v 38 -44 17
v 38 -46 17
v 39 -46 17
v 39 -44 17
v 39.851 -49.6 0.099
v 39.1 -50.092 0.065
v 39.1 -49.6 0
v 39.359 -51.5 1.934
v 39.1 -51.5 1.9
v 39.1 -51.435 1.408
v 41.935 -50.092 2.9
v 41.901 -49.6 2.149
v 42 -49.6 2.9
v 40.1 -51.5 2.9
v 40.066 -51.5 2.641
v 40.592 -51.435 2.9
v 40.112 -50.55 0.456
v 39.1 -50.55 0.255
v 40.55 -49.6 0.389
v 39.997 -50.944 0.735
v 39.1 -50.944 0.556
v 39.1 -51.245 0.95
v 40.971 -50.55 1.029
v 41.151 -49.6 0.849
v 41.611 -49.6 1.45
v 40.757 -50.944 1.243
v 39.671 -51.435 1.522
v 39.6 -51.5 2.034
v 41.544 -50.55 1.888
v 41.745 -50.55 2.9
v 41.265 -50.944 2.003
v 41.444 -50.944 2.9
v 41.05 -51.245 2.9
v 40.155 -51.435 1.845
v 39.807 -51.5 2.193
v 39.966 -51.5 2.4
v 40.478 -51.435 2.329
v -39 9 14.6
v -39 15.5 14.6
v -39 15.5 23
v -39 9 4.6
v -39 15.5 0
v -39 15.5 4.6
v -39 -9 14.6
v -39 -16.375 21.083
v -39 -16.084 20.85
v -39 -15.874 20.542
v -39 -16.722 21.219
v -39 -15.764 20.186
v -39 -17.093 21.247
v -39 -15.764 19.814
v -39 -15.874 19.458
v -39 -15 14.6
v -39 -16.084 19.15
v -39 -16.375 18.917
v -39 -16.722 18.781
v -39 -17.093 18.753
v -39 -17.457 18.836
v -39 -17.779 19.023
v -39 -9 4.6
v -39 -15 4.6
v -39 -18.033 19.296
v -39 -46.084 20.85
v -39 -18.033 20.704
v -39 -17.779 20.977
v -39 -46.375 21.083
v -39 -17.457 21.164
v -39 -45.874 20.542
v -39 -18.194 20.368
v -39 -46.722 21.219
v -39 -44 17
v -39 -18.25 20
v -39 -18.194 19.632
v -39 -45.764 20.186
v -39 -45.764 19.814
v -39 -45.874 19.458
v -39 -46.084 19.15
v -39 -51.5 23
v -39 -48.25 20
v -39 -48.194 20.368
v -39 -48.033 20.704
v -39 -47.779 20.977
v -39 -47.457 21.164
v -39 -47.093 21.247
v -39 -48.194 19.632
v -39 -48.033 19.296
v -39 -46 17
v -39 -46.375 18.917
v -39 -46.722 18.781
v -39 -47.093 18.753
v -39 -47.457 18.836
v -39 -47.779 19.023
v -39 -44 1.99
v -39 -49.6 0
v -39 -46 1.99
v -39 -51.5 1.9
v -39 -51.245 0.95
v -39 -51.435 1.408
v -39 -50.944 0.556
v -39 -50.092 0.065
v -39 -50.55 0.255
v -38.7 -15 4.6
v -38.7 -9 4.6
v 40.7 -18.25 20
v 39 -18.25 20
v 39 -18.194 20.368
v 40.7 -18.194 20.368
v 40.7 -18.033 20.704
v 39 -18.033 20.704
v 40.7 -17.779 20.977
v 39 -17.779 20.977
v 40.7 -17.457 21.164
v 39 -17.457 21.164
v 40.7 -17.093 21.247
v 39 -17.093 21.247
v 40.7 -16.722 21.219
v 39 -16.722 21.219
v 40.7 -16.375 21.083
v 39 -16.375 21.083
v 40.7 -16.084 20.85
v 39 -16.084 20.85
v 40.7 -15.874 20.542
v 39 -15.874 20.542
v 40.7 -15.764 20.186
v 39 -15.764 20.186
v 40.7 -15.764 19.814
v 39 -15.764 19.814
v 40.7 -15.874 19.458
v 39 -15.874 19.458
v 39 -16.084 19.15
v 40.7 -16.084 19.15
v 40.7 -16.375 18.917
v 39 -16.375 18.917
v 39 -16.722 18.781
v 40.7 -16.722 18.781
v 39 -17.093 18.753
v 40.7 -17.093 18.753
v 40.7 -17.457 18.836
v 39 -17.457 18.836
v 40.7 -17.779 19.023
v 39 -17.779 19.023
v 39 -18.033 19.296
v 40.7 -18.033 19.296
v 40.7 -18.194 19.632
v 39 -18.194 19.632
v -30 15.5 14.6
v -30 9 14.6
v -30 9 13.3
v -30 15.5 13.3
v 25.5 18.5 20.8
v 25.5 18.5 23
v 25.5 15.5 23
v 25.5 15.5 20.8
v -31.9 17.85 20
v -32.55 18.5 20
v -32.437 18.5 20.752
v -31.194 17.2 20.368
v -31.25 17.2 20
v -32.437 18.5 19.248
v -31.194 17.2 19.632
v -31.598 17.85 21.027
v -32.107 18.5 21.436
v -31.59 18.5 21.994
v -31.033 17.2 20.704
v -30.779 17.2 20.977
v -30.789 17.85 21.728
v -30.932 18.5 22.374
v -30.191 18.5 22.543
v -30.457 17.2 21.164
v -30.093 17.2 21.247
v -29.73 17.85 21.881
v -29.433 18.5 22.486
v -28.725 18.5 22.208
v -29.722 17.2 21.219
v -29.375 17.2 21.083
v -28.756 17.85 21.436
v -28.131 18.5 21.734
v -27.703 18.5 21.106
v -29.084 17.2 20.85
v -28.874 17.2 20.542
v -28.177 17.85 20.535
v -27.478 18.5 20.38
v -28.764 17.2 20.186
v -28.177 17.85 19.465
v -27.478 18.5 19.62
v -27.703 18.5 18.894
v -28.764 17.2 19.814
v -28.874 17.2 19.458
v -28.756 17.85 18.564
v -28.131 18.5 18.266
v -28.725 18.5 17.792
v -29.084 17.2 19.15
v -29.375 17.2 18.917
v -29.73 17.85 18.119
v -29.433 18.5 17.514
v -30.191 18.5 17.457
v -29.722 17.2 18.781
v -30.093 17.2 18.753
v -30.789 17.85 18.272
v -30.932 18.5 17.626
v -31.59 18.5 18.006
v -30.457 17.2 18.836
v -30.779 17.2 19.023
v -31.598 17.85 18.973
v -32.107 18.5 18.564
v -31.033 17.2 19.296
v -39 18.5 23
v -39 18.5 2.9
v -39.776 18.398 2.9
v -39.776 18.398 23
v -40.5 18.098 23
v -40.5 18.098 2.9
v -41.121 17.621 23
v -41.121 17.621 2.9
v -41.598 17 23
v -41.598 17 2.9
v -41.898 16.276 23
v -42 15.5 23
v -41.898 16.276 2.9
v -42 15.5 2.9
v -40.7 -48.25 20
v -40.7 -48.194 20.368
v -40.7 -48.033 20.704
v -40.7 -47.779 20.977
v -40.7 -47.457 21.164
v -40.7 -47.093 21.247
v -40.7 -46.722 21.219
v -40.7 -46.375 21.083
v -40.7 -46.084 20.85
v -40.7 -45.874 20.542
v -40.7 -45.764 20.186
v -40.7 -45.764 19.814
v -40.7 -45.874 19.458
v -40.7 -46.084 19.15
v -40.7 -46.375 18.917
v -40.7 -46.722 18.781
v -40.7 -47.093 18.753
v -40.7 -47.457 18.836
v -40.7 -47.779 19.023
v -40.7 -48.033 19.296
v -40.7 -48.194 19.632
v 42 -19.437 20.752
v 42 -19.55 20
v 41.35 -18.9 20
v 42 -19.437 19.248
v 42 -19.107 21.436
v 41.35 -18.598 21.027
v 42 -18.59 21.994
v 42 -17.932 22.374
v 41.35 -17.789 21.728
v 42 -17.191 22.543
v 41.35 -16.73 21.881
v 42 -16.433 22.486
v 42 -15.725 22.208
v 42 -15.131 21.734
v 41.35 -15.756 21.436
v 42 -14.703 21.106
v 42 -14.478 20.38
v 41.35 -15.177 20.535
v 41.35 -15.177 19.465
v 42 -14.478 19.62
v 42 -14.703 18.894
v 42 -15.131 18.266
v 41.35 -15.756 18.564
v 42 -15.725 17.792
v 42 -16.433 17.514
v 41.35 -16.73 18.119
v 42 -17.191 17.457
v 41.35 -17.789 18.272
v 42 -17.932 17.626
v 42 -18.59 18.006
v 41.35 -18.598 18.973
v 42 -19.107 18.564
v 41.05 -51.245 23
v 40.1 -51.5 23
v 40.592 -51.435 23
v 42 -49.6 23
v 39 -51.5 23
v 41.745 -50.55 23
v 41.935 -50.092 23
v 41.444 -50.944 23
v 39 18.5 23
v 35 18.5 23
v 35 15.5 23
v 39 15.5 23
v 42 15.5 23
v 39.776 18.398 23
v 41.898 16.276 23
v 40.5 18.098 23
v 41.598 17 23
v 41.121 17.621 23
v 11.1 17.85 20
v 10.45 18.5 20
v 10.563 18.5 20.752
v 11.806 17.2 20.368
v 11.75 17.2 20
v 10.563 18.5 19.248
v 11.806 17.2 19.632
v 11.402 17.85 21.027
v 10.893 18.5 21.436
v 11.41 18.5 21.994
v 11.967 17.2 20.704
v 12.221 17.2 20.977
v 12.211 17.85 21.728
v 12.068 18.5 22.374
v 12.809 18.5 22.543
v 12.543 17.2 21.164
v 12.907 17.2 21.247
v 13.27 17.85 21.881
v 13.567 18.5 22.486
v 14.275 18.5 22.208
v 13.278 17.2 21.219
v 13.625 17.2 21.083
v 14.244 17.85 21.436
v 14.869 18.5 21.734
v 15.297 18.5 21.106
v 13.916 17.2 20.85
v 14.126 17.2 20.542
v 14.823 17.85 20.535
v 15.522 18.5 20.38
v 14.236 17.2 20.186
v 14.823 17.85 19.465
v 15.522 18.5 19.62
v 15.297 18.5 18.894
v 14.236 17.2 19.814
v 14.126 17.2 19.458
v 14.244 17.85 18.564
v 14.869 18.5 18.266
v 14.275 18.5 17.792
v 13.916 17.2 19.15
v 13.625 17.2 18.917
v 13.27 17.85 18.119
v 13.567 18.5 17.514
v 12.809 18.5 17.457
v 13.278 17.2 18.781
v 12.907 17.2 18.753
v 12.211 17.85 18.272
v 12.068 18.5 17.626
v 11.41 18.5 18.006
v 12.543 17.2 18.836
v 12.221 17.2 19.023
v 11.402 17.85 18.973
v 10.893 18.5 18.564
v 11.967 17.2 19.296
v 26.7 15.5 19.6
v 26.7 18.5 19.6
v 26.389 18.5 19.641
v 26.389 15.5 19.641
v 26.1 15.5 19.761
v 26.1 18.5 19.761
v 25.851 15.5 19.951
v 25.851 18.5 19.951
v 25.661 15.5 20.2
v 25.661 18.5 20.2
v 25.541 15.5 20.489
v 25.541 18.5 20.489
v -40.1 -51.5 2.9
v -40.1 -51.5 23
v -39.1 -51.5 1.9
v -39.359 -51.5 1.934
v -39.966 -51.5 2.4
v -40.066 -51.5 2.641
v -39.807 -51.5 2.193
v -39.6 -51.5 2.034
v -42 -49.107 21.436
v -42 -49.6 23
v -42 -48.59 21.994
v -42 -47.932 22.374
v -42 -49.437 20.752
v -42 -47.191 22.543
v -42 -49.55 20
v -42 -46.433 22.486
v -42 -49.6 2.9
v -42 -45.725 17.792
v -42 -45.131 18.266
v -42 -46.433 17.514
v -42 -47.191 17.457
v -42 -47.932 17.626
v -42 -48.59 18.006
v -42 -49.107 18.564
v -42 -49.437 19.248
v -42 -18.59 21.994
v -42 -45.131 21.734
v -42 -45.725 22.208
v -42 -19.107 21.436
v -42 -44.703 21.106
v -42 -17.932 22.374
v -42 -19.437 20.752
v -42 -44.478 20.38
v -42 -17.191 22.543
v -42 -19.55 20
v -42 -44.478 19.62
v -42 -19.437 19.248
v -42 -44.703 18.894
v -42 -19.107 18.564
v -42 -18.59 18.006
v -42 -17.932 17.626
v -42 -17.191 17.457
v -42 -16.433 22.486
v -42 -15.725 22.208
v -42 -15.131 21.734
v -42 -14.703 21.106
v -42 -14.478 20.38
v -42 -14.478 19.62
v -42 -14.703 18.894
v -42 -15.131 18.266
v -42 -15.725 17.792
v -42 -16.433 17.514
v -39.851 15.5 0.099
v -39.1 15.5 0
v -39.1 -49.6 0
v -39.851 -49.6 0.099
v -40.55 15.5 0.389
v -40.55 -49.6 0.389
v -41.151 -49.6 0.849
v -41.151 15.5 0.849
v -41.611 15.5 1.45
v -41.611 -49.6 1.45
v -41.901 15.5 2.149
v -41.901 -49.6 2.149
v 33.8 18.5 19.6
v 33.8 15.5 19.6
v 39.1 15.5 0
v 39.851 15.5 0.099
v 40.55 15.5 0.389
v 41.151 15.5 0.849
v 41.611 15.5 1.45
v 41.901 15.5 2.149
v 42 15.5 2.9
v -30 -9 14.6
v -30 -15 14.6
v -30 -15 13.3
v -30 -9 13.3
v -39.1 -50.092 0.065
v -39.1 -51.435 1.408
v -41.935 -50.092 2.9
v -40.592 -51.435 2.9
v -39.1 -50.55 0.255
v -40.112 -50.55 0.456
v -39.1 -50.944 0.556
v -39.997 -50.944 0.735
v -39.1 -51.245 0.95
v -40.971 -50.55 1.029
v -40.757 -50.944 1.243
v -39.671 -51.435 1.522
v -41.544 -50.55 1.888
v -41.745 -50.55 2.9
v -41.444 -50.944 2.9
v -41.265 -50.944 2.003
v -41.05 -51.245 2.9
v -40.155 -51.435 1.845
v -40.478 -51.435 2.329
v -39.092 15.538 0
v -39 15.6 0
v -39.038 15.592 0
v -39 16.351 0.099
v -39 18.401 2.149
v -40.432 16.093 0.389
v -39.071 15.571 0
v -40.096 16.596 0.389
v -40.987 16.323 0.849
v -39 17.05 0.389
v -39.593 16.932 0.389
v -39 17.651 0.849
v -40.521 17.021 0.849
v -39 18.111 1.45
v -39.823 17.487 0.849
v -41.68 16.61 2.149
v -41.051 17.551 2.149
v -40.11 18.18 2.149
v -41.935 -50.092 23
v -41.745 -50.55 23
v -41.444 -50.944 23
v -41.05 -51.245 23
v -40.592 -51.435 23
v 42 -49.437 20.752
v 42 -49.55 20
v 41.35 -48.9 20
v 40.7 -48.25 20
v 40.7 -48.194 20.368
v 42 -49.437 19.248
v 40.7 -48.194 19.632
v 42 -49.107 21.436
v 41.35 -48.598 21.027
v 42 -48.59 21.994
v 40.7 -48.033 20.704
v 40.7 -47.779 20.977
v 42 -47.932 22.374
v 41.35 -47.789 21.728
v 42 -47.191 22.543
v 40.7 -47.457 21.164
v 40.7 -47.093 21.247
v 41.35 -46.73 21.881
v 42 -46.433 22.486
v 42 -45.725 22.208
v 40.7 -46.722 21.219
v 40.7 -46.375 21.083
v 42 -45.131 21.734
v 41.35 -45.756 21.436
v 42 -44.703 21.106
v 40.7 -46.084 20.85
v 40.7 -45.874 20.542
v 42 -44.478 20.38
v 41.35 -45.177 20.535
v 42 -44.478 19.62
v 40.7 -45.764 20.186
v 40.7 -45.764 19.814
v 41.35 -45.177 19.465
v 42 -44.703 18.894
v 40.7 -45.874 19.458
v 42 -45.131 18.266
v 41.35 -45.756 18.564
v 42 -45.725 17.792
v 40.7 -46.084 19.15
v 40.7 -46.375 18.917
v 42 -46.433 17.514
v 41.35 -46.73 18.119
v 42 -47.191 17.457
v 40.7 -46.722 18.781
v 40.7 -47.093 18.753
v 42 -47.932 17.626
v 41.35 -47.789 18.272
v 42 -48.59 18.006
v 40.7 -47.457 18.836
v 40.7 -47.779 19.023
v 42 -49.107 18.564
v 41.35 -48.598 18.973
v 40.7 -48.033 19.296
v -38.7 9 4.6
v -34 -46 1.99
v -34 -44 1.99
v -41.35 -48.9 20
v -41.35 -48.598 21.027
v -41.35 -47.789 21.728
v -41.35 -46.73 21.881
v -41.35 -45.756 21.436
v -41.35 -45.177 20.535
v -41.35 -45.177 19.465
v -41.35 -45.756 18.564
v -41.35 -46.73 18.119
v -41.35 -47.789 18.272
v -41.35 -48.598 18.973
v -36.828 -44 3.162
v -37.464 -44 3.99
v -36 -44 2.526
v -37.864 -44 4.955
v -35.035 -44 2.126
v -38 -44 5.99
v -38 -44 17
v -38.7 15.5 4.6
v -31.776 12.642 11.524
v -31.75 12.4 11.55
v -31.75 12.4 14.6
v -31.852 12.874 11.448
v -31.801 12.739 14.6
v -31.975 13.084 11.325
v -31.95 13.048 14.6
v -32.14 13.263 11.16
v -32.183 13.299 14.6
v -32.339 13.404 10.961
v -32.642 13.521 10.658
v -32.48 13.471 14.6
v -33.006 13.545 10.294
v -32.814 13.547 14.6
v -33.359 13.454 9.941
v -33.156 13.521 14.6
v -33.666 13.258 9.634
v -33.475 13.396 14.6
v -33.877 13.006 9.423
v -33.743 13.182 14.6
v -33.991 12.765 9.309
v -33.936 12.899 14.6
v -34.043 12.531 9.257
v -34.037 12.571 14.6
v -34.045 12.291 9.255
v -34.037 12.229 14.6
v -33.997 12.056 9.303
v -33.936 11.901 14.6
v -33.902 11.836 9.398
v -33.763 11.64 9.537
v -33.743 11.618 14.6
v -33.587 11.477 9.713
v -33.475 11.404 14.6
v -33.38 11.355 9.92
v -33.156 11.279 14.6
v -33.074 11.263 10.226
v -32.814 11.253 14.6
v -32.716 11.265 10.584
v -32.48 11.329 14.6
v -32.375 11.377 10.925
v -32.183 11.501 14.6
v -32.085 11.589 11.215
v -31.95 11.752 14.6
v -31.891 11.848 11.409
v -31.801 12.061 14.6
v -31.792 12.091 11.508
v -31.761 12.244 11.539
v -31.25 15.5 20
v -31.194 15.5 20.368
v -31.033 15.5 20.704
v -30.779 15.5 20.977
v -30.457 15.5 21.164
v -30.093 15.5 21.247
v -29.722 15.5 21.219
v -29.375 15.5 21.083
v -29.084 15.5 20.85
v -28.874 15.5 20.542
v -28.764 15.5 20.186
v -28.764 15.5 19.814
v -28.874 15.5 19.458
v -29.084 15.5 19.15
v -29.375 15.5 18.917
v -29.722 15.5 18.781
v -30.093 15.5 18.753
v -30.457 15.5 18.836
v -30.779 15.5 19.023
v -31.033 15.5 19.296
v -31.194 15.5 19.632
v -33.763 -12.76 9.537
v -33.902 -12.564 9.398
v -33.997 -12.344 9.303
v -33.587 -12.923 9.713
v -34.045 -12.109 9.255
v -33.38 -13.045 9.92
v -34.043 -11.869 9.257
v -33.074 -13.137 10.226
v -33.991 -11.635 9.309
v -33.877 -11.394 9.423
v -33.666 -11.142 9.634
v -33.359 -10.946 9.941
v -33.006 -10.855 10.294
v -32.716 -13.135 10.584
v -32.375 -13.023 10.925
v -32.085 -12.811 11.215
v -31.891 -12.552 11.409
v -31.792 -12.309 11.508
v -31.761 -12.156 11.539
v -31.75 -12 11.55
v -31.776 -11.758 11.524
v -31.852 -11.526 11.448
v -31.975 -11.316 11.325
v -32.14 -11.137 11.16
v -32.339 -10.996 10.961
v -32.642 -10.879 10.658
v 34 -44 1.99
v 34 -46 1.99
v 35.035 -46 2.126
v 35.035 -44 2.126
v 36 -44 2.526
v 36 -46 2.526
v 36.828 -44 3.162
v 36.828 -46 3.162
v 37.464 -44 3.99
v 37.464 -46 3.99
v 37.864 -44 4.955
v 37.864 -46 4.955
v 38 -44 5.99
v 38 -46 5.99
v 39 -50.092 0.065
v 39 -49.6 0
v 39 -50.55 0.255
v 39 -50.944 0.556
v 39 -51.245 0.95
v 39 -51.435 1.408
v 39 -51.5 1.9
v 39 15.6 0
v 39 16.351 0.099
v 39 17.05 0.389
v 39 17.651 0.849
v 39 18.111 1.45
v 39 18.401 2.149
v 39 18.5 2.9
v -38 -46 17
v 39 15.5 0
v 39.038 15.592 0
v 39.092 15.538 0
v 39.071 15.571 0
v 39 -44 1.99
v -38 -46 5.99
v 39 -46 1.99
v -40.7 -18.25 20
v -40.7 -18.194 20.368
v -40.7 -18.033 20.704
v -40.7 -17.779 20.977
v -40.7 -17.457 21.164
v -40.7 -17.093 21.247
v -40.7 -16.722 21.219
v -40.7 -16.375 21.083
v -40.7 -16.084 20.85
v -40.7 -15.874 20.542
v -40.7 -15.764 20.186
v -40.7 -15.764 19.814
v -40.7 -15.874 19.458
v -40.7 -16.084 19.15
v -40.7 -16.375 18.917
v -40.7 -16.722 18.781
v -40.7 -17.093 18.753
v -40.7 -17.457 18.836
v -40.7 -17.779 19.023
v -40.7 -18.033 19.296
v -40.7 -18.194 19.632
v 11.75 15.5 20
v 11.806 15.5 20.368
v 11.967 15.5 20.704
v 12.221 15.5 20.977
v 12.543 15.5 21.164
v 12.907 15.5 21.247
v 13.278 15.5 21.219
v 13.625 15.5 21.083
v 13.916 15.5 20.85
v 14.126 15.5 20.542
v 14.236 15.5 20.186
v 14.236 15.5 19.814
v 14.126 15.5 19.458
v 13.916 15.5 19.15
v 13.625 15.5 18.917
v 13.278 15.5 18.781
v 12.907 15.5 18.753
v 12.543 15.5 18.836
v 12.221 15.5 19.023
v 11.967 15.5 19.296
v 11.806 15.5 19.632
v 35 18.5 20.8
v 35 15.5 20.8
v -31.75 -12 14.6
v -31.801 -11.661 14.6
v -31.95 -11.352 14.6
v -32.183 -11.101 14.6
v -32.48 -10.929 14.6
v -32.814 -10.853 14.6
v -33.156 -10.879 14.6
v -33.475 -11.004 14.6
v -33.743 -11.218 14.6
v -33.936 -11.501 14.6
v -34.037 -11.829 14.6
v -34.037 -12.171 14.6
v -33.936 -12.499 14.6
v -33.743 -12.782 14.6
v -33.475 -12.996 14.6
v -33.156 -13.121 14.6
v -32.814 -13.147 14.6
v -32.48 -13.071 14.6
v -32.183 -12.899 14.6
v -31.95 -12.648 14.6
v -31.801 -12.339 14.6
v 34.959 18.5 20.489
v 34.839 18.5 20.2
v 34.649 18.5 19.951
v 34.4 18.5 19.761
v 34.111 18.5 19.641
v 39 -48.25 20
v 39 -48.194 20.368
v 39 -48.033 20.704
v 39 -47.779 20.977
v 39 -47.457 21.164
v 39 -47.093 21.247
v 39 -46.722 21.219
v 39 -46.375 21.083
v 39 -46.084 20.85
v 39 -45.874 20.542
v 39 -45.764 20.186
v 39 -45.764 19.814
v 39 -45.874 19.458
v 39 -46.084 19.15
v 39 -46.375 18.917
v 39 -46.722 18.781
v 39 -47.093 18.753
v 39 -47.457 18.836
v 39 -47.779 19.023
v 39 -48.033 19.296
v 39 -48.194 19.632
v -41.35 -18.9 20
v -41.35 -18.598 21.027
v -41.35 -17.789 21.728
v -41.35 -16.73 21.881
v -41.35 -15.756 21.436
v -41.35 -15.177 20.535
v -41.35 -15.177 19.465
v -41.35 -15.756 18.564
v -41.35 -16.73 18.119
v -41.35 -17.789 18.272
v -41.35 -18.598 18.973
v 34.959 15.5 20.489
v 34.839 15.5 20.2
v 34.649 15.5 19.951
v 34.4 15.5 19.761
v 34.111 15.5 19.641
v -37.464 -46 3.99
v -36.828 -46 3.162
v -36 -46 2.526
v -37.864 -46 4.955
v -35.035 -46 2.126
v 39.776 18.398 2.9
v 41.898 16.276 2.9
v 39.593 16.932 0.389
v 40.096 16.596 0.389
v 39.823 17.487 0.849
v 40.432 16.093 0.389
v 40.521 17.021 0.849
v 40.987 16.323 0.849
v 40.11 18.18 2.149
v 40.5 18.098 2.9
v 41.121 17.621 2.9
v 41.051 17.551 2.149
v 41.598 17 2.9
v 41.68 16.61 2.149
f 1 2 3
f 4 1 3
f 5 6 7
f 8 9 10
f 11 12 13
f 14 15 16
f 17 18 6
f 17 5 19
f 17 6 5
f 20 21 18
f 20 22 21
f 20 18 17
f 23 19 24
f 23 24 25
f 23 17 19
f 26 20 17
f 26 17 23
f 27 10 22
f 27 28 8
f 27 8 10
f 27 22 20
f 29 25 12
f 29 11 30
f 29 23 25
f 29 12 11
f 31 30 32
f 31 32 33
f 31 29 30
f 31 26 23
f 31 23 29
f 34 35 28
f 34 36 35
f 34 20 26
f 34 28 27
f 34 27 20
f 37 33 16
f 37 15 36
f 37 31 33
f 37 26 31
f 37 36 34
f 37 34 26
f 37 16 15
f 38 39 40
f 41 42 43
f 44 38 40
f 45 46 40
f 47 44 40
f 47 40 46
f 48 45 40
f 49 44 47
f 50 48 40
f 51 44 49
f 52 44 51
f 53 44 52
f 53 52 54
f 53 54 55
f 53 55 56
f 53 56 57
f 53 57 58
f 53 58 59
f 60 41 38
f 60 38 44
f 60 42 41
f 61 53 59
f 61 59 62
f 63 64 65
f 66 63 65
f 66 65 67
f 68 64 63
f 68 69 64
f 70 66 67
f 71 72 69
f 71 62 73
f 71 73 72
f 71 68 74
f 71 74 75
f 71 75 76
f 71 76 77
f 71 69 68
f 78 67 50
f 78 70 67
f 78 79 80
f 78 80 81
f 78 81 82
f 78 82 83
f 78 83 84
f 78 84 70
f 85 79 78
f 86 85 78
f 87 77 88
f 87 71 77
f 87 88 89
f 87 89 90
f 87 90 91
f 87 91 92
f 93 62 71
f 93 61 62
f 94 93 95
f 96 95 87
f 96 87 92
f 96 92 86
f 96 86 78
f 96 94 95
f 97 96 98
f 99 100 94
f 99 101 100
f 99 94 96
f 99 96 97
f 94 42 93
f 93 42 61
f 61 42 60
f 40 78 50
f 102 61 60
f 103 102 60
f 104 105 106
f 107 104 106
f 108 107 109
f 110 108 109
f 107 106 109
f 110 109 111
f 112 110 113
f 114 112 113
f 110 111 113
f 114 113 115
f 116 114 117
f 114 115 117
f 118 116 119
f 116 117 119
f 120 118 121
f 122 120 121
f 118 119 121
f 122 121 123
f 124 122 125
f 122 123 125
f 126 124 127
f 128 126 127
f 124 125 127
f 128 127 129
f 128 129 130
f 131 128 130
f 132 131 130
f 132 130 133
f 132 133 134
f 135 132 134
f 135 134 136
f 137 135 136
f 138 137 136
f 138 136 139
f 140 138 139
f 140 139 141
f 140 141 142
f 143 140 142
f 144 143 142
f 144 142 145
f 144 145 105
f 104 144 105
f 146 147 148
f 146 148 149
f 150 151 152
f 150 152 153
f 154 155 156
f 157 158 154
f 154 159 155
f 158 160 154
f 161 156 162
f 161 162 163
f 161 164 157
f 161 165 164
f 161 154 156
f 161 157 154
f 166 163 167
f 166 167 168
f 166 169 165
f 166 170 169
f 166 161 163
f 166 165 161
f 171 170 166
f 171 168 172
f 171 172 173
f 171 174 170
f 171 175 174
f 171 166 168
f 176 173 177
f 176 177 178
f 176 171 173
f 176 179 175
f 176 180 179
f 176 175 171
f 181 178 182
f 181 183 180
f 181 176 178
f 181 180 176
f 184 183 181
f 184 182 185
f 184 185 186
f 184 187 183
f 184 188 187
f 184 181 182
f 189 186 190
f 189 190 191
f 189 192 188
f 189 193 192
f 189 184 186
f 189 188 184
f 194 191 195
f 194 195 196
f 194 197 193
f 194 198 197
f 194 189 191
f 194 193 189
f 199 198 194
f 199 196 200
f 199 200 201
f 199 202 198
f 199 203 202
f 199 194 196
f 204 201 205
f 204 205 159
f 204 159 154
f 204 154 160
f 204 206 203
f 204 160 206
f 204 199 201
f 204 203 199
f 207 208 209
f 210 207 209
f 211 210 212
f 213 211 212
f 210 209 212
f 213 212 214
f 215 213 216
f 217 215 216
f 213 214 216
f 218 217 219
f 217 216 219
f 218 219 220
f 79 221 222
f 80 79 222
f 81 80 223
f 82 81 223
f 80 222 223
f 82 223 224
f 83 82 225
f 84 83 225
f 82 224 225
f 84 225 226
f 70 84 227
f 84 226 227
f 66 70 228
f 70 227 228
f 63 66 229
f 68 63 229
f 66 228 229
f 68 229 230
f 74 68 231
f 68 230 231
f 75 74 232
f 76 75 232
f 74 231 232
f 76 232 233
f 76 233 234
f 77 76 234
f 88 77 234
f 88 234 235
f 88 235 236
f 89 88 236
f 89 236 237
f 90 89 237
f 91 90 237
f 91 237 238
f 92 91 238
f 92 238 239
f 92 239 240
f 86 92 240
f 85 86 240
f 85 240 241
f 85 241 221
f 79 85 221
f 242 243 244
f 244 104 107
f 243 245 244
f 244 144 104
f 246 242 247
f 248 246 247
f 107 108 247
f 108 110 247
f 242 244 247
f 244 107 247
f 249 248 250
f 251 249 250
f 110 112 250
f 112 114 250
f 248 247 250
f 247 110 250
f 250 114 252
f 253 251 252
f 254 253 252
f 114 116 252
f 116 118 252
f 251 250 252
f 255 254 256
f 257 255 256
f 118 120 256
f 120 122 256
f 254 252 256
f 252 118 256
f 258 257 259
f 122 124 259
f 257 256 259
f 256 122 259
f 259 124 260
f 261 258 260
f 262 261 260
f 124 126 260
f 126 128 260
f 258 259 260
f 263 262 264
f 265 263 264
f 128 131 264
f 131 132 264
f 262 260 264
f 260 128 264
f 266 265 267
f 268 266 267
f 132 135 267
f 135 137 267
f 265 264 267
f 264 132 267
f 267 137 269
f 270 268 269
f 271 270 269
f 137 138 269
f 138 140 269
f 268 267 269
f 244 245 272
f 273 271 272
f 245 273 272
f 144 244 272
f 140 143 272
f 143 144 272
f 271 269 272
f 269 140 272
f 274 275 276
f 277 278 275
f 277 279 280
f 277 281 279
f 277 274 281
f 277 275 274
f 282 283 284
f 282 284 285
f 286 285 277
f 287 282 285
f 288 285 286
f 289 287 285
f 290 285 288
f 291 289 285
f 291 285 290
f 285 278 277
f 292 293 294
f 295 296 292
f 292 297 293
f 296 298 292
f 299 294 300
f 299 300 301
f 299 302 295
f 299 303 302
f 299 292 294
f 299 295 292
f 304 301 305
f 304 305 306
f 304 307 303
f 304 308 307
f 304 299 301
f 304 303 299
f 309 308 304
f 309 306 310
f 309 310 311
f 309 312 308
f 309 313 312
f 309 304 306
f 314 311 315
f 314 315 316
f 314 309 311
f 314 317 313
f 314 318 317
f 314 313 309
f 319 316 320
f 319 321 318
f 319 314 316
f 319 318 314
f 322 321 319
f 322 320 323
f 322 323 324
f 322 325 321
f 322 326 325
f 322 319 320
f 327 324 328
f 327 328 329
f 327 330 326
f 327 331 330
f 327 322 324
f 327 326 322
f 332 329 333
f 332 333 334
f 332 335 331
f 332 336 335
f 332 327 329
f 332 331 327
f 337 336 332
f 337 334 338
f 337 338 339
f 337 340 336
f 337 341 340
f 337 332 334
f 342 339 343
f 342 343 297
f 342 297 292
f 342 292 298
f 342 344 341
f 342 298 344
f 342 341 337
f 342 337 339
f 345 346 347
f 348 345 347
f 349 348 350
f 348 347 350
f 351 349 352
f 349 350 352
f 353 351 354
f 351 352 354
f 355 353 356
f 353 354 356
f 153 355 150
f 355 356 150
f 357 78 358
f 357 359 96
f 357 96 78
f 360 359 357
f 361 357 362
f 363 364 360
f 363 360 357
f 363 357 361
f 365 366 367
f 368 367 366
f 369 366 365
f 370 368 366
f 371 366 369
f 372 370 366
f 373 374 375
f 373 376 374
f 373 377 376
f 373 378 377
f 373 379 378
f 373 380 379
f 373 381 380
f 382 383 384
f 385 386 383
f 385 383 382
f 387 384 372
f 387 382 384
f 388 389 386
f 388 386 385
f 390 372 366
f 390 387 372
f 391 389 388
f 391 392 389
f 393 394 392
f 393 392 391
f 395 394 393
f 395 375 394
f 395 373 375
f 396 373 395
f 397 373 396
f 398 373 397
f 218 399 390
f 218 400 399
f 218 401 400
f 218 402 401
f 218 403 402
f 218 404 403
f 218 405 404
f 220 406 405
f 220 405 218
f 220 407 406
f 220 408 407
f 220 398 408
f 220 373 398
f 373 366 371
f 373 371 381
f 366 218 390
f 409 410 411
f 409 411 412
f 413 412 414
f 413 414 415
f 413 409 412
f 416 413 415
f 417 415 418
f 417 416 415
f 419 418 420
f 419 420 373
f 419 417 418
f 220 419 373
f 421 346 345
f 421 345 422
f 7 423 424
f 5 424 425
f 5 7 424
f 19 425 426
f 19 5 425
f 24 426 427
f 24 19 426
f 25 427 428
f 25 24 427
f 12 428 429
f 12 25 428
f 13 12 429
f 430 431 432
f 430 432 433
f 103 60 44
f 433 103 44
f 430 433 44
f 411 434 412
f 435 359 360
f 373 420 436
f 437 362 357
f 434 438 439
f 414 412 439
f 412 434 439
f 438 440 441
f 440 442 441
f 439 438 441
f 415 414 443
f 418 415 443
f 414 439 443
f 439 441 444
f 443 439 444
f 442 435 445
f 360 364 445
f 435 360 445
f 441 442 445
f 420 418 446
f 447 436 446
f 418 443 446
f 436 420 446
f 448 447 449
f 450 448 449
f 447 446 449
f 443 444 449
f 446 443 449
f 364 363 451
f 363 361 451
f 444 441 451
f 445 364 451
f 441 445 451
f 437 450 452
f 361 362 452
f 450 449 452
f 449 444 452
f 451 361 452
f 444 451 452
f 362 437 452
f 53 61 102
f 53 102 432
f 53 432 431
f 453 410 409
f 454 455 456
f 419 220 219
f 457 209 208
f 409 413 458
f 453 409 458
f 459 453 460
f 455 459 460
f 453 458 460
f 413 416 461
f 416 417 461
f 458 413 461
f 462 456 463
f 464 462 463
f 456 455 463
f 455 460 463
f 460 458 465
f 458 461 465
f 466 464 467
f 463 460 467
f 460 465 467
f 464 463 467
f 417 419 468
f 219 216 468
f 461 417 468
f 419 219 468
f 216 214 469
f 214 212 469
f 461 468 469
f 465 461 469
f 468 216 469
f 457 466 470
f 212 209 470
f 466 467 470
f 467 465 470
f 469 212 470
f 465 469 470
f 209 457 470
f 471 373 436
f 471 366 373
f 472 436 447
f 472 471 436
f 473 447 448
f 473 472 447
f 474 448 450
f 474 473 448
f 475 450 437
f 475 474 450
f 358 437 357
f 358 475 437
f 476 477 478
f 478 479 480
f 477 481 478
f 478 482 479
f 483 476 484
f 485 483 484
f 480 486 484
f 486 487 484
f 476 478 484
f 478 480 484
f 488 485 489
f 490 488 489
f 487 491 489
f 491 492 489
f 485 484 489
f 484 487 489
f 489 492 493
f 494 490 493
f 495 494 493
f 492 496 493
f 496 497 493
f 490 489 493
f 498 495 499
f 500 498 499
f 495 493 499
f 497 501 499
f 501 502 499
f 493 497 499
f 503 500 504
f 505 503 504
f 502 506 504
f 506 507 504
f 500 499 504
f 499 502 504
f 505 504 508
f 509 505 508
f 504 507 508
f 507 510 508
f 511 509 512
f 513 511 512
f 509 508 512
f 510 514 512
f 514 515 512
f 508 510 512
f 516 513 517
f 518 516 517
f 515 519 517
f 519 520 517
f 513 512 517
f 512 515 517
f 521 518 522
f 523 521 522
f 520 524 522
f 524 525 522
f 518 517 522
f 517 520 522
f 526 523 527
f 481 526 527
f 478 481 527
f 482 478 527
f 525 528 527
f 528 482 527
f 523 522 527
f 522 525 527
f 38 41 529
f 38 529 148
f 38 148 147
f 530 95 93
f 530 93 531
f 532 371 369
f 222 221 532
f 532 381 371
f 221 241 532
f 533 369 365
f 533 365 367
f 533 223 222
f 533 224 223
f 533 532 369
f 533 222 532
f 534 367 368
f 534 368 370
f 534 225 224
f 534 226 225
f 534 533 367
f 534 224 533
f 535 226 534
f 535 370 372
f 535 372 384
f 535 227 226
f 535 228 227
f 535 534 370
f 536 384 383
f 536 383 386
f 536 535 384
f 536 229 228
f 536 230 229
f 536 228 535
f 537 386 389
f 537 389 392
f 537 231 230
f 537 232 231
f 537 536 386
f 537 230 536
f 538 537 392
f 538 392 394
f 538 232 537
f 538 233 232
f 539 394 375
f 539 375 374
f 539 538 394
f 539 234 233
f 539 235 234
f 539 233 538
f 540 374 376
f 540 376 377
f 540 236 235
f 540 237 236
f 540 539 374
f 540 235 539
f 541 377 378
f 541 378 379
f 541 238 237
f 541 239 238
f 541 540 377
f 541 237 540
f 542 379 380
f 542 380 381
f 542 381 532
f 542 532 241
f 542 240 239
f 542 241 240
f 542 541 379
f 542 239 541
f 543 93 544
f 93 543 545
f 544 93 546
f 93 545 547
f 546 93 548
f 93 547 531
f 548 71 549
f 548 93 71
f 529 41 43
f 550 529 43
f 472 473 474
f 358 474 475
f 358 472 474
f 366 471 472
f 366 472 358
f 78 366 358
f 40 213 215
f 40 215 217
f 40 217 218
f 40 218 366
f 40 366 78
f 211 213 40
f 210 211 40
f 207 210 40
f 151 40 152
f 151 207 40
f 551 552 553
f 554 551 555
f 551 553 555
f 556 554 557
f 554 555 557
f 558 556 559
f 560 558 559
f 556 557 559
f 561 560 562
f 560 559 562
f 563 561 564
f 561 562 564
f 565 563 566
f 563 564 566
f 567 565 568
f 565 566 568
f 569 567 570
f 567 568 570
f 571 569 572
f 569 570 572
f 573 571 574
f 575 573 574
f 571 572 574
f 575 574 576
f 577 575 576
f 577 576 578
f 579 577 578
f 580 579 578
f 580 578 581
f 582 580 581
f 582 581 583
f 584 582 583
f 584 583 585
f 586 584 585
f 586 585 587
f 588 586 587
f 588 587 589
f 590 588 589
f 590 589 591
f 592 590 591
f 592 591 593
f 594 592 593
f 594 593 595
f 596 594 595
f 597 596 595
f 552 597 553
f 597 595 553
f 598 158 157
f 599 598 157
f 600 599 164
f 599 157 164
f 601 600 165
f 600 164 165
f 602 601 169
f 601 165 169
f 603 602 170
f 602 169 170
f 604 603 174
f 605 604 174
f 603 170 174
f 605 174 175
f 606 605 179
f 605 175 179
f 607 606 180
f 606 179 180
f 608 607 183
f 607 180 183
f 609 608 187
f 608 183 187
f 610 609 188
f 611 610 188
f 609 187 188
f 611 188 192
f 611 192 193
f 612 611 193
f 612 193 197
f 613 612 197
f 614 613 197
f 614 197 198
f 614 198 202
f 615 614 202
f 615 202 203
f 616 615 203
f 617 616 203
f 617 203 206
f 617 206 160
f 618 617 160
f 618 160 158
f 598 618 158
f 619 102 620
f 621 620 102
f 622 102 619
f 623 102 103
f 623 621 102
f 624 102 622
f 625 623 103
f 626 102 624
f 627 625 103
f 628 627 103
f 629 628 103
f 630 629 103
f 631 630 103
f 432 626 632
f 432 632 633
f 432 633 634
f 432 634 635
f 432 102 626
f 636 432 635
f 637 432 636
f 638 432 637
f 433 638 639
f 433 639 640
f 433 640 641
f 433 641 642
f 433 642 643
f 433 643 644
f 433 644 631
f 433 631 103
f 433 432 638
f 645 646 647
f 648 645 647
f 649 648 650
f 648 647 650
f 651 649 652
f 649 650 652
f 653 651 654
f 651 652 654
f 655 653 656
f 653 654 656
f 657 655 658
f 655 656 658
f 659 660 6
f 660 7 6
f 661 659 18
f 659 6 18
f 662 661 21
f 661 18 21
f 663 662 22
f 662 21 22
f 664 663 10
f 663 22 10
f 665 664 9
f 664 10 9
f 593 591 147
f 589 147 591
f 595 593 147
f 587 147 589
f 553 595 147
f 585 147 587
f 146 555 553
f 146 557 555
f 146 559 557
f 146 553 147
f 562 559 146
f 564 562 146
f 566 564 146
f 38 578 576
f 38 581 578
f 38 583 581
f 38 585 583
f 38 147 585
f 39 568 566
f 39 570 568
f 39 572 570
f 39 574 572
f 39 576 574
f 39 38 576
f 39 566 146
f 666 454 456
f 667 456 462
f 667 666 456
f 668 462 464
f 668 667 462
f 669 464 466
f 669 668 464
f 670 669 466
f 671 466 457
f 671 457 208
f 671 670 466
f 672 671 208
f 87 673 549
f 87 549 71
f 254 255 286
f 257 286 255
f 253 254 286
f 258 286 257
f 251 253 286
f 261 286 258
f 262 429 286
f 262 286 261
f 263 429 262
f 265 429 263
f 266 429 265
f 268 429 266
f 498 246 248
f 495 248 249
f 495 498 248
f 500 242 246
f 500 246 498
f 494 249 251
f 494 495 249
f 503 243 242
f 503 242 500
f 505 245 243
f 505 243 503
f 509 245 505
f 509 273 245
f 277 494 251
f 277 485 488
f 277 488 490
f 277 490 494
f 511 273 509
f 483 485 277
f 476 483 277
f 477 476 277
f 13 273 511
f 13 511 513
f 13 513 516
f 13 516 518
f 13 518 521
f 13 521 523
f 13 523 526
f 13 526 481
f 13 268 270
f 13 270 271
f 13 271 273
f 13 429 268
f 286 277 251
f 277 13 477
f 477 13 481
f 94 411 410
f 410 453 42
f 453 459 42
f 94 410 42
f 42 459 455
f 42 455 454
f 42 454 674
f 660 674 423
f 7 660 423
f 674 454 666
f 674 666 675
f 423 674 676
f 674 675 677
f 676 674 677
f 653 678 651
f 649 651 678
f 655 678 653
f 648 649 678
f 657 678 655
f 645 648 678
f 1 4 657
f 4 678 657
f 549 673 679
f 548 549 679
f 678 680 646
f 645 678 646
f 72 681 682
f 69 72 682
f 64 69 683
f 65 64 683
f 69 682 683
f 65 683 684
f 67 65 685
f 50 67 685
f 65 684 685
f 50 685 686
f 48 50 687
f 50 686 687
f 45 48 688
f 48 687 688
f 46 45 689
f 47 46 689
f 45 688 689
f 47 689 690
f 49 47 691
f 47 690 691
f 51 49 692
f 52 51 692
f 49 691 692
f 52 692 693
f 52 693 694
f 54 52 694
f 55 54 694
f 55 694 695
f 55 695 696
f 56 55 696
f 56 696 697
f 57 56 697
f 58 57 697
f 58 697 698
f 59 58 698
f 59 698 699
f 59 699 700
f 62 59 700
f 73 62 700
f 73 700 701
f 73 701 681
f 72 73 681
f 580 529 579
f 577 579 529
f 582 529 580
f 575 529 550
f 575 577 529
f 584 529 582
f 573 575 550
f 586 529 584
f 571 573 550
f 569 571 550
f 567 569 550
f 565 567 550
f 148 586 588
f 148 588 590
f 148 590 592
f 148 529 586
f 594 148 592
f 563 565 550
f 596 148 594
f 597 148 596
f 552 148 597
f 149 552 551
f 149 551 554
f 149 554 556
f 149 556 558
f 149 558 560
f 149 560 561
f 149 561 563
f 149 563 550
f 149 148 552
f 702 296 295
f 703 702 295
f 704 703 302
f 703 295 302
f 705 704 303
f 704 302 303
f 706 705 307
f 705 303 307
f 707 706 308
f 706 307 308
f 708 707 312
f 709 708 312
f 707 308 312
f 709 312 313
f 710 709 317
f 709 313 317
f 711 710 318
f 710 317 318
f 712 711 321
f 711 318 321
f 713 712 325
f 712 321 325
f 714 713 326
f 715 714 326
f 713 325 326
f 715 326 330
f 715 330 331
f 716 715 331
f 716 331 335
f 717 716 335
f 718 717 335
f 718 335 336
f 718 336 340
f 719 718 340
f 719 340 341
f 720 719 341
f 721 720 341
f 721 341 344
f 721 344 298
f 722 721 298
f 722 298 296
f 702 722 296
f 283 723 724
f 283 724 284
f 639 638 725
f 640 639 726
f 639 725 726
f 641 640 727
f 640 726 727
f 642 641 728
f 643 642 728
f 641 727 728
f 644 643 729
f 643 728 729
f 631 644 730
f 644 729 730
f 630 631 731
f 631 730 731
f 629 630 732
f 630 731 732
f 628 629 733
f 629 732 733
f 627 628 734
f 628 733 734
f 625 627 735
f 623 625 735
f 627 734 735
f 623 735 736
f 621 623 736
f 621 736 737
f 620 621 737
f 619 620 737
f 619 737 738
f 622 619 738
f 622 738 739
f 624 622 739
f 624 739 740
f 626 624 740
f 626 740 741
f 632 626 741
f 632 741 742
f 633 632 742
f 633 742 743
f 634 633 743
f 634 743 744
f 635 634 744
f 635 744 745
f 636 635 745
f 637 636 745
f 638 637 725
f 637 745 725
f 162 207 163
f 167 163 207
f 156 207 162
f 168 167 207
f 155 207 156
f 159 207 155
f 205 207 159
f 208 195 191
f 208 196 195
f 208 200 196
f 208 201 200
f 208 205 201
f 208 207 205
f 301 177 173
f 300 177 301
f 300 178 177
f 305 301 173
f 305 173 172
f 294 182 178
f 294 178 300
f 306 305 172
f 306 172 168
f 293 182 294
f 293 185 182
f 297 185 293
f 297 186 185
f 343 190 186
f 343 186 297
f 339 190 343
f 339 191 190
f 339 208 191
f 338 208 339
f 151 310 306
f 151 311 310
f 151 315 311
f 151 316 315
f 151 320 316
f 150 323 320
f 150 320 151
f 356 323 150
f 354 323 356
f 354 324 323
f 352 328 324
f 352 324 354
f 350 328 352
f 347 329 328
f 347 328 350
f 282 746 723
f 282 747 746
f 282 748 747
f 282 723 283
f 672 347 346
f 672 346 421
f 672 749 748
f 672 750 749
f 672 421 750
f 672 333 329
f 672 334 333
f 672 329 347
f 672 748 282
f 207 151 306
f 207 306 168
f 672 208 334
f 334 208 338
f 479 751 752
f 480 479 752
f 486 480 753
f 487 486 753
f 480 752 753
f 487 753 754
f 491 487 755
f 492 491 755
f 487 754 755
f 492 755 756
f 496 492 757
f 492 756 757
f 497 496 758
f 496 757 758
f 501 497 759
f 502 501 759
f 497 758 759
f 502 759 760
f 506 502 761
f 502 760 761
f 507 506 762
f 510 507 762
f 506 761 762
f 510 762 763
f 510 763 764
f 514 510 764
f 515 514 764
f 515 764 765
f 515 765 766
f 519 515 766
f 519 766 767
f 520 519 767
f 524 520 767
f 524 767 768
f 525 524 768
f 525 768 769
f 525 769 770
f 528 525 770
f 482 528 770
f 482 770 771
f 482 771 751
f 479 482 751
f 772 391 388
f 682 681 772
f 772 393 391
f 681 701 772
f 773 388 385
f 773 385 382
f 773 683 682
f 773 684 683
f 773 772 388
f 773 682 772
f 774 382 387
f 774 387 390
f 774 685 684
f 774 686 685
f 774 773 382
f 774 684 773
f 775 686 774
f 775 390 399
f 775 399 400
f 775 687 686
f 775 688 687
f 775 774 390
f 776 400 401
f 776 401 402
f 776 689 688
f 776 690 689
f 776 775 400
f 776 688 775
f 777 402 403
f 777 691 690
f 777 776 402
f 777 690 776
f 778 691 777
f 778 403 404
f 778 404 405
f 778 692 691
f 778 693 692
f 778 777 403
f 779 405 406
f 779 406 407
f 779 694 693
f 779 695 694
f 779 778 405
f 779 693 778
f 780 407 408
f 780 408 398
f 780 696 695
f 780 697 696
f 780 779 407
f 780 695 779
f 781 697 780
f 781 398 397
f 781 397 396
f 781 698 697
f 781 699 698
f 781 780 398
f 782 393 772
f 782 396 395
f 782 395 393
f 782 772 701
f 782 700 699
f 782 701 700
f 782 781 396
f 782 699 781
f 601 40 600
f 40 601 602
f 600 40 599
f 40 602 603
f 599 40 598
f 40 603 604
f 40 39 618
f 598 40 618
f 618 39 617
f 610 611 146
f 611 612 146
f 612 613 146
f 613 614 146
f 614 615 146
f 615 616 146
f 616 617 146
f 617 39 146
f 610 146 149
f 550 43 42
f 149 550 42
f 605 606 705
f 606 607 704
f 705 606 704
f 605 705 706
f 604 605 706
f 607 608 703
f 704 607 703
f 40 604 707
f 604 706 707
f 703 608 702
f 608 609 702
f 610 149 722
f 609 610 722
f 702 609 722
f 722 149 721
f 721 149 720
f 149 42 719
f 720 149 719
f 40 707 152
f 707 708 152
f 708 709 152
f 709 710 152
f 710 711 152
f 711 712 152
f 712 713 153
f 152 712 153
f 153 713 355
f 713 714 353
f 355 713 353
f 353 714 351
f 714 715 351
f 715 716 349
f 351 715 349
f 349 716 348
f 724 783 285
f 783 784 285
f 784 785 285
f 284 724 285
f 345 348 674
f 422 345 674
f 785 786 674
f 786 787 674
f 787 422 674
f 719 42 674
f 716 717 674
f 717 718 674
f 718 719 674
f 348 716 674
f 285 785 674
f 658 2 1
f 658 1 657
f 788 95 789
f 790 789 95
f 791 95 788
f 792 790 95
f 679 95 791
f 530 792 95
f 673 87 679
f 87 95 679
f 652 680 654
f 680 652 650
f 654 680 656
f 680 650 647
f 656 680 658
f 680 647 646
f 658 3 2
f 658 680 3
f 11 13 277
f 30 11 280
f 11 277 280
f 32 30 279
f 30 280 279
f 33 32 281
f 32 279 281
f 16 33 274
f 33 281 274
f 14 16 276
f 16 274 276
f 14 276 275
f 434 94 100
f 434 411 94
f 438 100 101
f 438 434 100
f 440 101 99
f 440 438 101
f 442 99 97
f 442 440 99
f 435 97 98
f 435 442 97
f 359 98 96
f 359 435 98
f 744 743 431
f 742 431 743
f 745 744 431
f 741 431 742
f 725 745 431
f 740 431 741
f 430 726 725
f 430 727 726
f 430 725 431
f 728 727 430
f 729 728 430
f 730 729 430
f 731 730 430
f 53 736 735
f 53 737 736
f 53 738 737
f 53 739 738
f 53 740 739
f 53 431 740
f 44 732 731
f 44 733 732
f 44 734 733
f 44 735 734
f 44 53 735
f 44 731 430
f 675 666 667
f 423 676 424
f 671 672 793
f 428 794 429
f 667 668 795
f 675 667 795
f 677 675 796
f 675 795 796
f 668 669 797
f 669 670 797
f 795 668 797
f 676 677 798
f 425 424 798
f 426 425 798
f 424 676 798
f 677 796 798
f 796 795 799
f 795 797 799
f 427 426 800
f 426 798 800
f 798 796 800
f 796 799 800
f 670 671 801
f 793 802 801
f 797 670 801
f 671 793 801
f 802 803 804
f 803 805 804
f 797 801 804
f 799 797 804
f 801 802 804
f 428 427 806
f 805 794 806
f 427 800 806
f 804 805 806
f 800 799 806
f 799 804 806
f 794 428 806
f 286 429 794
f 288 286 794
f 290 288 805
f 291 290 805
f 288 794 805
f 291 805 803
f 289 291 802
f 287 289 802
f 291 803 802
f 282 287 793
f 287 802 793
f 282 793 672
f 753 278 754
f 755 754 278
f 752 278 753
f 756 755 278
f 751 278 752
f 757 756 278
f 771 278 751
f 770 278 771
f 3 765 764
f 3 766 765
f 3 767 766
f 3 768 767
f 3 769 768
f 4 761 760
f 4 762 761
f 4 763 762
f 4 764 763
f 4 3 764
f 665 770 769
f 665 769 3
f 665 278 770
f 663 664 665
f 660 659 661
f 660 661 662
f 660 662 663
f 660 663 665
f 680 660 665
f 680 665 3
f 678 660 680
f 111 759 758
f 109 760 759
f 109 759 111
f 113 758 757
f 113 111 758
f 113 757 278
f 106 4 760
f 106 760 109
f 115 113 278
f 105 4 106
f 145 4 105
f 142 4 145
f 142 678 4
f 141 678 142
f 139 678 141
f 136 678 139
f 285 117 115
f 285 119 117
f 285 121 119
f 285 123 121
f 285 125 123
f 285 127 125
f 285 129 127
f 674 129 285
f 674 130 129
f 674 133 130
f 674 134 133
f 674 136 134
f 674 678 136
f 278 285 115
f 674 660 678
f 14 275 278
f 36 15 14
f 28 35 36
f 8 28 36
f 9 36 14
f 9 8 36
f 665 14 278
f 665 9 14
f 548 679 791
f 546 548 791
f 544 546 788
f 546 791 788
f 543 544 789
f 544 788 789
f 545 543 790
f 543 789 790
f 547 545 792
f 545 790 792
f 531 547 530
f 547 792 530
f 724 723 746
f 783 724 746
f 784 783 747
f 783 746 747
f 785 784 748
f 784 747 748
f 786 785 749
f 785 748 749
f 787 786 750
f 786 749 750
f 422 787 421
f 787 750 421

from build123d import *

# Parameters (mm, degrees)
PAD011_DEPTH    = 23
POCKET004_DEPTH = 5
SKETCH018_R     = 1.25
POCKET005_DEPTH = 84.001
SKETCH019_R     = 1.25
POCKET006_DEPTH = 5
CHAMFER_SIZE    = 1.3
PAD015_DEPTH    = 2
FILLET004_R     = 2.9
FILLET005_R     = 1.9
SKETCH023_W     = 6
SKETCH023_H     = 10
SKETCH023_W_2   = 7
PAD016_DEPTH    = 9
CHAMFER001_SIZE = 8.7
SKETCH024_R     = 1.15
POCKET007_DEPTH = 7


with BuildPart() as part:
    # Sketch015 → Pad011 (new body)
    with BuildSketch(Plane.XY):
        with BuildLine():
            ThreePointArc((-39, 18.5), (-41.12132, 17.62132), (-42, 15.5))
            Line((-42, -51.5), (-42, 15.5))
            Line((-39, -51.5), (-42, -51.5))
            Line((-39, 15.5), (-39, -51.5))
            Line((-39, 15.5), (39, 15.5))
            Line((39, -51.5), (39, 15.5))
            Line((42, -51.5), (39, -51.5))
            Line((42, 15.5), (42, -51.5))
            ThreePointArc((42, 15.5), (41.12132, 17.62132), (39, 18.5))
            Line((-39, 18.5), (39, 18.5))
        make_face()
    extrude(amount=PAD011_DEPTH)

    # Sketch017 (on Face10 of Pad011) → Pocket004 (cut)
    with BuildSketch(Plane(origin=(0, 18.5, 0), x_dir=(-1, 0, 0), z_dir=(0, 1, 0))):
        with BuildLine():
            Line((-25.5, 23), (-25.5, 20.8))
            ThreePointArc((-26.7, 19.6), (-25.851472, 19.951472), (-25.5, 20.8))
            Line((-26.7, 19.6), (-33.8, 19.6))
            ThreePointArc((-35, 20.8), (-34.648528, 19.951472), (-33.8, 19.6))
            Line((-35, 20.8), (-35, 23))
            Line((-35, 23), (-25.5, 23))
        make_face()
    extrude(amount=-POCKET004_DEPTH, mode=Mode.SUBTRACT)

    # Sketch018 (on Face3 of Pocket004) → Pocket005 (cut, through all)
    with BuildSketch(Plane(origin=(-42, 0, 0), x_dir=(0, -1, 0), z_dir=(-1, 0, 0))):
        with Locations((17, 20)):
            Circle(SKETCH018_R)
        with Locations((47, 20)):
            Circle(SKETCH018_R)
    extrude(amount=-POCKET005_DEPTH, mode=Mode.SUBTRACT)

    # Sketch019 (on Face2 of Pocket005) → Pocket006 (cut)
    with BuildSketch(Plane(origin=(0, 18.5, 0), x_dir=(-1, 0, 0), z_dir=(0, 1, 0))):
        with Locations((-13, 20)):
            Circle(SKETCH019_R)
        with Locations((30, 20)):
            Circle(SKETCH019_R)
    extrude(amount=-POCKET006_DEPTH, mode=Mode.SUBTRACT)

    # Chamfer
    chamfer_edges = [part.edges().sort_by_distance(p)[0] for p in [
        (14.25, 18.5, 20),
        (-28.75, 18.5, 20),
        (-42, -45.75, 20),
        (42, -45.75, 20),
        (42, -15.75, 20),
        (-42, -15.75, 20),
    ]]
    chamfer(chamfer_edges, length=CHAMFER_SIZE)

    # Sketch022 (on Face16 of Chamfer) → Pad015 (join)
    with BuildSketch(Plane.XZ.offset(46)):
        with BuildLine():
            Line((38, 17), (39, 17))
            Line((39, 17), (39, 1.99))
            Line((39, 1.99), (34, 1.99))
            ThreePointArc((34, 1.99), (36.828427, 3.161573), (38, 5.99))
            Line((38, 17), (38, 5.99))
        make_face()
        with BuildLine():
            Line((-38, 17), (-39, 17))
            Line((-39, 17), (-39, 1.99))
            Line((-39, 1.99), (-34, 1.99))
            ThreePointArc((-38, 5.99), (-36.828427, 3.161573), (-34, 1.99))
            Line((-38, 17), (-38, 5.99))
        make_face()
    extrude(amount=-PAD015_DEPTH)

    # Fillet004
    fillet004_edges = [part.edges().sort_by_distance(p)[0] for p in [
        (42, -18, 0),
        (41.12132, 17.62132, 0),
        (0, 18.5, 0),
        (-41.12132, 17.62132, 0),
        (-42, -18, 0),
    ]]
    fillet(fillet004_edges, radius=FILLET004_R)

    # Fillet005
    fillet005_edges = [part.edges().sort_by_distance(p)[0] for p in [
        (-42, -51.5, 12.95),
        (42, -51.5, 12.95),
        (41.15061, -51.5, 0.84939),
        (-41.15061, -51.5, 0.84939),
    ]]
    fillet(fillet005_edges, radius=FILLET005_R)

    # Sketch023 (on Face4 of Fillet005) → Pad016 (join)
    with BuildSketch(Plane.YZ.offset(-39)):
        with Locations((-12, 9.6)):
            Rectangle(SKETCH023_W, SKETCH023_H)
        with Locations((12.5, 9.6)):
            Rectangle(SKETCH023_W_2, SKETCH023_H)
    extrude(amount=PAD016_DEPTH)

    # Chamfer001
    chamfer001_edges = [part.edges().sort_by_distance(p)[0] for p in [
        (-30, 12.25, 4.6),
        (-30, -12, 4.6),
    ]]
    chamfer(chamfer001_edges, length=CHAMFER001_SIZE)

    # Sketch024 (on Face26 of Chamfer001) → Pocket007 (cut)
    with BuildSketch(Plane.XY.offset(14.6)):
        with Locations((-32.9, -12)):
            Circle(SKETCH024_R)
        with Locations((-32.9, 12.4)):
            Circle(SKETCH024_R)
    extrude(amount=-POCKET007_DEPTH, mode=Mode.SUBTRACT)


solid = part.part
